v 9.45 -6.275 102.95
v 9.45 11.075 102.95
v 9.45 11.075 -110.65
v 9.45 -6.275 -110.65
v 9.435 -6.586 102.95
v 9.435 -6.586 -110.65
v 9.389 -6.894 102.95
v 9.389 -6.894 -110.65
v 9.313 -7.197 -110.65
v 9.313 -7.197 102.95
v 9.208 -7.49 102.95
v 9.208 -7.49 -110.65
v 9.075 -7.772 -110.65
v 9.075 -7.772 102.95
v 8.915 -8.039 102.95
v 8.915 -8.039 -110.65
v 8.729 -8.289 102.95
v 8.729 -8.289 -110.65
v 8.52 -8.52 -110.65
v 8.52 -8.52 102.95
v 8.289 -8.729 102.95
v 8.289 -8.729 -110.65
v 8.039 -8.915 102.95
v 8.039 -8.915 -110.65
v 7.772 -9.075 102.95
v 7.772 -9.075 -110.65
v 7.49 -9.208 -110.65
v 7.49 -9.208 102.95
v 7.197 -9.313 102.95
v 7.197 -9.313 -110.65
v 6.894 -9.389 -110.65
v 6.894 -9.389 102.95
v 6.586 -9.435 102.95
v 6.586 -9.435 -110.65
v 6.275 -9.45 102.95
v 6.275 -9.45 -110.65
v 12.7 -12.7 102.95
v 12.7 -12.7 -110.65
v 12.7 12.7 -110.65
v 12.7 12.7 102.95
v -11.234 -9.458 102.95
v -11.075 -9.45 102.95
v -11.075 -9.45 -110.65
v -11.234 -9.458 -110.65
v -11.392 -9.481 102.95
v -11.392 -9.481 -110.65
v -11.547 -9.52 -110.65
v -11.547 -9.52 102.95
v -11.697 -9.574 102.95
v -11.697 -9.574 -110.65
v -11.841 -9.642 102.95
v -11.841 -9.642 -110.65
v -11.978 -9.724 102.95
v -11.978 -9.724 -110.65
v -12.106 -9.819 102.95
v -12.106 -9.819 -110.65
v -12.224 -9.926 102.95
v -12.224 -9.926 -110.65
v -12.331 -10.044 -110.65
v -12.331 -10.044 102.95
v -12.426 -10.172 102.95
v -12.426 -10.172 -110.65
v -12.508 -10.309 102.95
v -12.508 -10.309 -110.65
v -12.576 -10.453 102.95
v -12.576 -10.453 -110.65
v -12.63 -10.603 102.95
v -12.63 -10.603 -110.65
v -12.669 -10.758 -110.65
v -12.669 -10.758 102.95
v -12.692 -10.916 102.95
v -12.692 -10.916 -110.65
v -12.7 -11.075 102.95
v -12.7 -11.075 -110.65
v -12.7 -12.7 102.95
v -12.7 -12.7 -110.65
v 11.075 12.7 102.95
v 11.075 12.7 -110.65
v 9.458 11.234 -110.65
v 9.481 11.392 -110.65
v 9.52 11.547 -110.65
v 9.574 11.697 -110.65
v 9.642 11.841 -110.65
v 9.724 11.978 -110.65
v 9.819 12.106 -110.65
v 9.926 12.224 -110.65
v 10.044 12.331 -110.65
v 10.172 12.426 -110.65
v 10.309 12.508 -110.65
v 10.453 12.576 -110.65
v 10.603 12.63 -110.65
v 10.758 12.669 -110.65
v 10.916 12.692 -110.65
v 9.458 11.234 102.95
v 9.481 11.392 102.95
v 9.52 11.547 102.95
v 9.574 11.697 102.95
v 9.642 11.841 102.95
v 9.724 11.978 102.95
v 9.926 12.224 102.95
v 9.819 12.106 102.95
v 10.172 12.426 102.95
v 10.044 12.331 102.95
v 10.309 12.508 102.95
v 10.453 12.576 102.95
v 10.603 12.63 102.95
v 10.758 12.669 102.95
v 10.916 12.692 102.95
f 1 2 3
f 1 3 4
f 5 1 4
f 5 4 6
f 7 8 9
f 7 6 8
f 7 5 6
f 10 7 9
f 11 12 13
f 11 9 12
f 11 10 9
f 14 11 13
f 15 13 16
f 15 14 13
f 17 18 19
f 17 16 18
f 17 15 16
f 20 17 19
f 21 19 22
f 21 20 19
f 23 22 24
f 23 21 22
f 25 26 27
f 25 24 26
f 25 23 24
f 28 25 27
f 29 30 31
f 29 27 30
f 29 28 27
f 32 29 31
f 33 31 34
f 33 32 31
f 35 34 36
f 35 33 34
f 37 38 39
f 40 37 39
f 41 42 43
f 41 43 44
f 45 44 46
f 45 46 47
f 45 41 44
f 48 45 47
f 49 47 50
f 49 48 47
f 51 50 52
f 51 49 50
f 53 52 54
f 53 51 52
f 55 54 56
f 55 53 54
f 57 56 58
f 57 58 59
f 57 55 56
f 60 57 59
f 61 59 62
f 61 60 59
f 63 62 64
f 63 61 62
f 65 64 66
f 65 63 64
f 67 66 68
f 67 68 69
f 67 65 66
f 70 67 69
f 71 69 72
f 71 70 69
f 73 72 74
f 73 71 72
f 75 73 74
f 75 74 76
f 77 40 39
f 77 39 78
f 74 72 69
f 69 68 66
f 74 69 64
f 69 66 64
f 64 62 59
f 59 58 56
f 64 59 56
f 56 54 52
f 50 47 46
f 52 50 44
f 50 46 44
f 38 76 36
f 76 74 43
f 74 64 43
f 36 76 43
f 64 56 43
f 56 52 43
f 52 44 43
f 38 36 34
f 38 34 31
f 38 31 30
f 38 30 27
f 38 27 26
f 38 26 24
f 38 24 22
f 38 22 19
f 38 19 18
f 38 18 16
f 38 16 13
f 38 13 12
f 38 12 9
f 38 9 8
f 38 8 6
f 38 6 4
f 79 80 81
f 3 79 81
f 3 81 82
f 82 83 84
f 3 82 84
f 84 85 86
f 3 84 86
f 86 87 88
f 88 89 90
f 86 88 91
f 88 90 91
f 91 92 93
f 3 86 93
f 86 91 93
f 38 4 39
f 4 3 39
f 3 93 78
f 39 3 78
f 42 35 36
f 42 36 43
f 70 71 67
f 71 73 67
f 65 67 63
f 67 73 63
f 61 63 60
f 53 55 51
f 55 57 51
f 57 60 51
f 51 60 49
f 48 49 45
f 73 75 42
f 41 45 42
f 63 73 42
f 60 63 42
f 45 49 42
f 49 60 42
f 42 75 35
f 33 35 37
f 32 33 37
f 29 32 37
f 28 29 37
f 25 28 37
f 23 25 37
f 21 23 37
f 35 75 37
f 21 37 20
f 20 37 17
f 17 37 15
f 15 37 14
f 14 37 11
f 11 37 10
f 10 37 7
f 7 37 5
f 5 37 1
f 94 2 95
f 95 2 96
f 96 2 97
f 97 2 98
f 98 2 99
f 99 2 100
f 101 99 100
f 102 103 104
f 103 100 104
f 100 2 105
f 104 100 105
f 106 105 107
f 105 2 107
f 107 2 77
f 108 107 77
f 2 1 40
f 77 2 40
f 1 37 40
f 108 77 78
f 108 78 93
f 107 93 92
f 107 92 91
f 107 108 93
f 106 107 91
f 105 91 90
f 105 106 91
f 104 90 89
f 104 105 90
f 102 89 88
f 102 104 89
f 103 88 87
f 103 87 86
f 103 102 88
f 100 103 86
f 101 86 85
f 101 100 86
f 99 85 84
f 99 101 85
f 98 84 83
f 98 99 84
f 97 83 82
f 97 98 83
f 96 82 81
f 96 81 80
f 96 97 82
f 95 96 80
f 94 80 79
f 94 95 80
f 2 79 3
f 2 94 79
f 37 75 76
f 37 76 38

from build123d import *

# Parameters (mm, degrees)
BOSS_EXTRUDE1_DEPTH     = 152.4
CUT_EXTRUDE1_START      = -6.35
CUT_EXTRUDE1_DEPTH      = 6.35
CUT_EXTRUDE2_DEPTH      = 154.454683865
CUT_EXTRUDE2_DEPTH_BACK = 154.454683865
SKETCH4_W               = 35.4
SKETCH4_H               = 35.921024484
SKETCH5_W               = 49.45
SKETCH5_H               = 25.4
CUT_EXTRUDE3_DEPTH      = 156.02325632


with BuildPart() as part:
    # Sketch2 → Boss-Extrude1 (new, symmetric)
    with BuildSketch(Plane.XY):
        with BuildLine():
            Line((-12.7, -12.7), (12.7, -12.7))
            Line((12.7, -12.7), (12.7, 12.7))
            Line((12.7, 12.7), (11.0749969, 12.7))
            ThreePointArc((11.0749969, 12.7), (9.925946189, 12.224047611), (9.4499938, 11.0749969))
            Line((9.4499938, 11.0749969), (9.4499938, -6.2749938))
            ThreePointArc((9.4499938, -6.2749938), (8.52005783, -8.52005783), (6.2749938, -9.4499938))
            Line((6.2749938, -9.4499938), (-11.0749969, -9.4499938))
            ThreePointArc((-11.0749969, -9.4499938), (-12.224047611, -9.925946189), (-12.7, -11.0749969))
            Line((-12.7, -11.0749969), (-12.7, -12.7))
        make_face()
    extrude(amount=BOSS_EXTRUDE1_DEPTH, both=True)

    # Sketch3 → Cut-Extrude1 (cut)
    with BuildSketch(Plane(origin=(0, 0, -152.4), x_dir=(-1, 0, 0), z_dir=(0, 0, -1)).offset(CUT_EXTRUDE1_START)):
        with BuildLine():
            Line((12.7, -12.7), (12.7, -11.0749969))
            ThreePointArc((12.7, -11.0749969), (12.224047611, -9.925946189), (11.0749969, -9.4499938))
            Line((11.0749969, -9.4499938), (-6.2749938, -9.4499938))
            ThreePointArc((-6.2749938, -9.4499938), (-8.52005783, -8.52005783), (-9.4499938, -6.2749938))
            Line((-9.4499938, -6.2749938), (-9.4499938, 11.0749969))
            ThreePointArc((-9.4499938, 11.0749969), (-9.925946189, 12.224047611), (-11.0749969, 12.7))
            Line((-11.0749969, 12.7), (-12.7, 12.7))
            Line((-12.7, 12.7), (-12.7, -12.7))
            Line((-12.7, -12.7), (12.7, -12.7))
        make_face()
    extrude(amount=CUT_EXTRUDE1_DEPTH, mode=Mode.SUBTRACT)

    # Sketch4 → Cut-Extrude2 (cut, two sides: drawn at the far end of the back side and taken through both)
    with BuildSketch(Plane(origin=(0, 0, 0), x_dir=(0, 0, -1), z_dir=(0.7071067811865476, -0.7071067811865475, 0)).offset(-CUT_EXTRUDE2_DEPTH_BACK)):
        with Locations((128.35, 0)):
            Rectangle(SKETCH4_W, SKETCH4_H)
    extrude(amount=CUT_EXTRUDE2_DEPTH + CUT_EXTRUDE2_DEPTH_BACK, mode=Mode.SUBTRACT)

    # Sketch5 → Cut-Extrude3 (cut, through all)
    with BuildSketch(Plane(origin=(12.7, 0, 0), x_dir=(0, 0, -1), z_dir=(1, 0, 0))):
        with Locations((-127.675, 0)):
            Rectangle(SKETCH5_W, SKETCH5_H)
    extrude(amount=-CUT_EXTRUDE3_DEPTH, mode=Mode.SUBTRACT)


solid = part.part
